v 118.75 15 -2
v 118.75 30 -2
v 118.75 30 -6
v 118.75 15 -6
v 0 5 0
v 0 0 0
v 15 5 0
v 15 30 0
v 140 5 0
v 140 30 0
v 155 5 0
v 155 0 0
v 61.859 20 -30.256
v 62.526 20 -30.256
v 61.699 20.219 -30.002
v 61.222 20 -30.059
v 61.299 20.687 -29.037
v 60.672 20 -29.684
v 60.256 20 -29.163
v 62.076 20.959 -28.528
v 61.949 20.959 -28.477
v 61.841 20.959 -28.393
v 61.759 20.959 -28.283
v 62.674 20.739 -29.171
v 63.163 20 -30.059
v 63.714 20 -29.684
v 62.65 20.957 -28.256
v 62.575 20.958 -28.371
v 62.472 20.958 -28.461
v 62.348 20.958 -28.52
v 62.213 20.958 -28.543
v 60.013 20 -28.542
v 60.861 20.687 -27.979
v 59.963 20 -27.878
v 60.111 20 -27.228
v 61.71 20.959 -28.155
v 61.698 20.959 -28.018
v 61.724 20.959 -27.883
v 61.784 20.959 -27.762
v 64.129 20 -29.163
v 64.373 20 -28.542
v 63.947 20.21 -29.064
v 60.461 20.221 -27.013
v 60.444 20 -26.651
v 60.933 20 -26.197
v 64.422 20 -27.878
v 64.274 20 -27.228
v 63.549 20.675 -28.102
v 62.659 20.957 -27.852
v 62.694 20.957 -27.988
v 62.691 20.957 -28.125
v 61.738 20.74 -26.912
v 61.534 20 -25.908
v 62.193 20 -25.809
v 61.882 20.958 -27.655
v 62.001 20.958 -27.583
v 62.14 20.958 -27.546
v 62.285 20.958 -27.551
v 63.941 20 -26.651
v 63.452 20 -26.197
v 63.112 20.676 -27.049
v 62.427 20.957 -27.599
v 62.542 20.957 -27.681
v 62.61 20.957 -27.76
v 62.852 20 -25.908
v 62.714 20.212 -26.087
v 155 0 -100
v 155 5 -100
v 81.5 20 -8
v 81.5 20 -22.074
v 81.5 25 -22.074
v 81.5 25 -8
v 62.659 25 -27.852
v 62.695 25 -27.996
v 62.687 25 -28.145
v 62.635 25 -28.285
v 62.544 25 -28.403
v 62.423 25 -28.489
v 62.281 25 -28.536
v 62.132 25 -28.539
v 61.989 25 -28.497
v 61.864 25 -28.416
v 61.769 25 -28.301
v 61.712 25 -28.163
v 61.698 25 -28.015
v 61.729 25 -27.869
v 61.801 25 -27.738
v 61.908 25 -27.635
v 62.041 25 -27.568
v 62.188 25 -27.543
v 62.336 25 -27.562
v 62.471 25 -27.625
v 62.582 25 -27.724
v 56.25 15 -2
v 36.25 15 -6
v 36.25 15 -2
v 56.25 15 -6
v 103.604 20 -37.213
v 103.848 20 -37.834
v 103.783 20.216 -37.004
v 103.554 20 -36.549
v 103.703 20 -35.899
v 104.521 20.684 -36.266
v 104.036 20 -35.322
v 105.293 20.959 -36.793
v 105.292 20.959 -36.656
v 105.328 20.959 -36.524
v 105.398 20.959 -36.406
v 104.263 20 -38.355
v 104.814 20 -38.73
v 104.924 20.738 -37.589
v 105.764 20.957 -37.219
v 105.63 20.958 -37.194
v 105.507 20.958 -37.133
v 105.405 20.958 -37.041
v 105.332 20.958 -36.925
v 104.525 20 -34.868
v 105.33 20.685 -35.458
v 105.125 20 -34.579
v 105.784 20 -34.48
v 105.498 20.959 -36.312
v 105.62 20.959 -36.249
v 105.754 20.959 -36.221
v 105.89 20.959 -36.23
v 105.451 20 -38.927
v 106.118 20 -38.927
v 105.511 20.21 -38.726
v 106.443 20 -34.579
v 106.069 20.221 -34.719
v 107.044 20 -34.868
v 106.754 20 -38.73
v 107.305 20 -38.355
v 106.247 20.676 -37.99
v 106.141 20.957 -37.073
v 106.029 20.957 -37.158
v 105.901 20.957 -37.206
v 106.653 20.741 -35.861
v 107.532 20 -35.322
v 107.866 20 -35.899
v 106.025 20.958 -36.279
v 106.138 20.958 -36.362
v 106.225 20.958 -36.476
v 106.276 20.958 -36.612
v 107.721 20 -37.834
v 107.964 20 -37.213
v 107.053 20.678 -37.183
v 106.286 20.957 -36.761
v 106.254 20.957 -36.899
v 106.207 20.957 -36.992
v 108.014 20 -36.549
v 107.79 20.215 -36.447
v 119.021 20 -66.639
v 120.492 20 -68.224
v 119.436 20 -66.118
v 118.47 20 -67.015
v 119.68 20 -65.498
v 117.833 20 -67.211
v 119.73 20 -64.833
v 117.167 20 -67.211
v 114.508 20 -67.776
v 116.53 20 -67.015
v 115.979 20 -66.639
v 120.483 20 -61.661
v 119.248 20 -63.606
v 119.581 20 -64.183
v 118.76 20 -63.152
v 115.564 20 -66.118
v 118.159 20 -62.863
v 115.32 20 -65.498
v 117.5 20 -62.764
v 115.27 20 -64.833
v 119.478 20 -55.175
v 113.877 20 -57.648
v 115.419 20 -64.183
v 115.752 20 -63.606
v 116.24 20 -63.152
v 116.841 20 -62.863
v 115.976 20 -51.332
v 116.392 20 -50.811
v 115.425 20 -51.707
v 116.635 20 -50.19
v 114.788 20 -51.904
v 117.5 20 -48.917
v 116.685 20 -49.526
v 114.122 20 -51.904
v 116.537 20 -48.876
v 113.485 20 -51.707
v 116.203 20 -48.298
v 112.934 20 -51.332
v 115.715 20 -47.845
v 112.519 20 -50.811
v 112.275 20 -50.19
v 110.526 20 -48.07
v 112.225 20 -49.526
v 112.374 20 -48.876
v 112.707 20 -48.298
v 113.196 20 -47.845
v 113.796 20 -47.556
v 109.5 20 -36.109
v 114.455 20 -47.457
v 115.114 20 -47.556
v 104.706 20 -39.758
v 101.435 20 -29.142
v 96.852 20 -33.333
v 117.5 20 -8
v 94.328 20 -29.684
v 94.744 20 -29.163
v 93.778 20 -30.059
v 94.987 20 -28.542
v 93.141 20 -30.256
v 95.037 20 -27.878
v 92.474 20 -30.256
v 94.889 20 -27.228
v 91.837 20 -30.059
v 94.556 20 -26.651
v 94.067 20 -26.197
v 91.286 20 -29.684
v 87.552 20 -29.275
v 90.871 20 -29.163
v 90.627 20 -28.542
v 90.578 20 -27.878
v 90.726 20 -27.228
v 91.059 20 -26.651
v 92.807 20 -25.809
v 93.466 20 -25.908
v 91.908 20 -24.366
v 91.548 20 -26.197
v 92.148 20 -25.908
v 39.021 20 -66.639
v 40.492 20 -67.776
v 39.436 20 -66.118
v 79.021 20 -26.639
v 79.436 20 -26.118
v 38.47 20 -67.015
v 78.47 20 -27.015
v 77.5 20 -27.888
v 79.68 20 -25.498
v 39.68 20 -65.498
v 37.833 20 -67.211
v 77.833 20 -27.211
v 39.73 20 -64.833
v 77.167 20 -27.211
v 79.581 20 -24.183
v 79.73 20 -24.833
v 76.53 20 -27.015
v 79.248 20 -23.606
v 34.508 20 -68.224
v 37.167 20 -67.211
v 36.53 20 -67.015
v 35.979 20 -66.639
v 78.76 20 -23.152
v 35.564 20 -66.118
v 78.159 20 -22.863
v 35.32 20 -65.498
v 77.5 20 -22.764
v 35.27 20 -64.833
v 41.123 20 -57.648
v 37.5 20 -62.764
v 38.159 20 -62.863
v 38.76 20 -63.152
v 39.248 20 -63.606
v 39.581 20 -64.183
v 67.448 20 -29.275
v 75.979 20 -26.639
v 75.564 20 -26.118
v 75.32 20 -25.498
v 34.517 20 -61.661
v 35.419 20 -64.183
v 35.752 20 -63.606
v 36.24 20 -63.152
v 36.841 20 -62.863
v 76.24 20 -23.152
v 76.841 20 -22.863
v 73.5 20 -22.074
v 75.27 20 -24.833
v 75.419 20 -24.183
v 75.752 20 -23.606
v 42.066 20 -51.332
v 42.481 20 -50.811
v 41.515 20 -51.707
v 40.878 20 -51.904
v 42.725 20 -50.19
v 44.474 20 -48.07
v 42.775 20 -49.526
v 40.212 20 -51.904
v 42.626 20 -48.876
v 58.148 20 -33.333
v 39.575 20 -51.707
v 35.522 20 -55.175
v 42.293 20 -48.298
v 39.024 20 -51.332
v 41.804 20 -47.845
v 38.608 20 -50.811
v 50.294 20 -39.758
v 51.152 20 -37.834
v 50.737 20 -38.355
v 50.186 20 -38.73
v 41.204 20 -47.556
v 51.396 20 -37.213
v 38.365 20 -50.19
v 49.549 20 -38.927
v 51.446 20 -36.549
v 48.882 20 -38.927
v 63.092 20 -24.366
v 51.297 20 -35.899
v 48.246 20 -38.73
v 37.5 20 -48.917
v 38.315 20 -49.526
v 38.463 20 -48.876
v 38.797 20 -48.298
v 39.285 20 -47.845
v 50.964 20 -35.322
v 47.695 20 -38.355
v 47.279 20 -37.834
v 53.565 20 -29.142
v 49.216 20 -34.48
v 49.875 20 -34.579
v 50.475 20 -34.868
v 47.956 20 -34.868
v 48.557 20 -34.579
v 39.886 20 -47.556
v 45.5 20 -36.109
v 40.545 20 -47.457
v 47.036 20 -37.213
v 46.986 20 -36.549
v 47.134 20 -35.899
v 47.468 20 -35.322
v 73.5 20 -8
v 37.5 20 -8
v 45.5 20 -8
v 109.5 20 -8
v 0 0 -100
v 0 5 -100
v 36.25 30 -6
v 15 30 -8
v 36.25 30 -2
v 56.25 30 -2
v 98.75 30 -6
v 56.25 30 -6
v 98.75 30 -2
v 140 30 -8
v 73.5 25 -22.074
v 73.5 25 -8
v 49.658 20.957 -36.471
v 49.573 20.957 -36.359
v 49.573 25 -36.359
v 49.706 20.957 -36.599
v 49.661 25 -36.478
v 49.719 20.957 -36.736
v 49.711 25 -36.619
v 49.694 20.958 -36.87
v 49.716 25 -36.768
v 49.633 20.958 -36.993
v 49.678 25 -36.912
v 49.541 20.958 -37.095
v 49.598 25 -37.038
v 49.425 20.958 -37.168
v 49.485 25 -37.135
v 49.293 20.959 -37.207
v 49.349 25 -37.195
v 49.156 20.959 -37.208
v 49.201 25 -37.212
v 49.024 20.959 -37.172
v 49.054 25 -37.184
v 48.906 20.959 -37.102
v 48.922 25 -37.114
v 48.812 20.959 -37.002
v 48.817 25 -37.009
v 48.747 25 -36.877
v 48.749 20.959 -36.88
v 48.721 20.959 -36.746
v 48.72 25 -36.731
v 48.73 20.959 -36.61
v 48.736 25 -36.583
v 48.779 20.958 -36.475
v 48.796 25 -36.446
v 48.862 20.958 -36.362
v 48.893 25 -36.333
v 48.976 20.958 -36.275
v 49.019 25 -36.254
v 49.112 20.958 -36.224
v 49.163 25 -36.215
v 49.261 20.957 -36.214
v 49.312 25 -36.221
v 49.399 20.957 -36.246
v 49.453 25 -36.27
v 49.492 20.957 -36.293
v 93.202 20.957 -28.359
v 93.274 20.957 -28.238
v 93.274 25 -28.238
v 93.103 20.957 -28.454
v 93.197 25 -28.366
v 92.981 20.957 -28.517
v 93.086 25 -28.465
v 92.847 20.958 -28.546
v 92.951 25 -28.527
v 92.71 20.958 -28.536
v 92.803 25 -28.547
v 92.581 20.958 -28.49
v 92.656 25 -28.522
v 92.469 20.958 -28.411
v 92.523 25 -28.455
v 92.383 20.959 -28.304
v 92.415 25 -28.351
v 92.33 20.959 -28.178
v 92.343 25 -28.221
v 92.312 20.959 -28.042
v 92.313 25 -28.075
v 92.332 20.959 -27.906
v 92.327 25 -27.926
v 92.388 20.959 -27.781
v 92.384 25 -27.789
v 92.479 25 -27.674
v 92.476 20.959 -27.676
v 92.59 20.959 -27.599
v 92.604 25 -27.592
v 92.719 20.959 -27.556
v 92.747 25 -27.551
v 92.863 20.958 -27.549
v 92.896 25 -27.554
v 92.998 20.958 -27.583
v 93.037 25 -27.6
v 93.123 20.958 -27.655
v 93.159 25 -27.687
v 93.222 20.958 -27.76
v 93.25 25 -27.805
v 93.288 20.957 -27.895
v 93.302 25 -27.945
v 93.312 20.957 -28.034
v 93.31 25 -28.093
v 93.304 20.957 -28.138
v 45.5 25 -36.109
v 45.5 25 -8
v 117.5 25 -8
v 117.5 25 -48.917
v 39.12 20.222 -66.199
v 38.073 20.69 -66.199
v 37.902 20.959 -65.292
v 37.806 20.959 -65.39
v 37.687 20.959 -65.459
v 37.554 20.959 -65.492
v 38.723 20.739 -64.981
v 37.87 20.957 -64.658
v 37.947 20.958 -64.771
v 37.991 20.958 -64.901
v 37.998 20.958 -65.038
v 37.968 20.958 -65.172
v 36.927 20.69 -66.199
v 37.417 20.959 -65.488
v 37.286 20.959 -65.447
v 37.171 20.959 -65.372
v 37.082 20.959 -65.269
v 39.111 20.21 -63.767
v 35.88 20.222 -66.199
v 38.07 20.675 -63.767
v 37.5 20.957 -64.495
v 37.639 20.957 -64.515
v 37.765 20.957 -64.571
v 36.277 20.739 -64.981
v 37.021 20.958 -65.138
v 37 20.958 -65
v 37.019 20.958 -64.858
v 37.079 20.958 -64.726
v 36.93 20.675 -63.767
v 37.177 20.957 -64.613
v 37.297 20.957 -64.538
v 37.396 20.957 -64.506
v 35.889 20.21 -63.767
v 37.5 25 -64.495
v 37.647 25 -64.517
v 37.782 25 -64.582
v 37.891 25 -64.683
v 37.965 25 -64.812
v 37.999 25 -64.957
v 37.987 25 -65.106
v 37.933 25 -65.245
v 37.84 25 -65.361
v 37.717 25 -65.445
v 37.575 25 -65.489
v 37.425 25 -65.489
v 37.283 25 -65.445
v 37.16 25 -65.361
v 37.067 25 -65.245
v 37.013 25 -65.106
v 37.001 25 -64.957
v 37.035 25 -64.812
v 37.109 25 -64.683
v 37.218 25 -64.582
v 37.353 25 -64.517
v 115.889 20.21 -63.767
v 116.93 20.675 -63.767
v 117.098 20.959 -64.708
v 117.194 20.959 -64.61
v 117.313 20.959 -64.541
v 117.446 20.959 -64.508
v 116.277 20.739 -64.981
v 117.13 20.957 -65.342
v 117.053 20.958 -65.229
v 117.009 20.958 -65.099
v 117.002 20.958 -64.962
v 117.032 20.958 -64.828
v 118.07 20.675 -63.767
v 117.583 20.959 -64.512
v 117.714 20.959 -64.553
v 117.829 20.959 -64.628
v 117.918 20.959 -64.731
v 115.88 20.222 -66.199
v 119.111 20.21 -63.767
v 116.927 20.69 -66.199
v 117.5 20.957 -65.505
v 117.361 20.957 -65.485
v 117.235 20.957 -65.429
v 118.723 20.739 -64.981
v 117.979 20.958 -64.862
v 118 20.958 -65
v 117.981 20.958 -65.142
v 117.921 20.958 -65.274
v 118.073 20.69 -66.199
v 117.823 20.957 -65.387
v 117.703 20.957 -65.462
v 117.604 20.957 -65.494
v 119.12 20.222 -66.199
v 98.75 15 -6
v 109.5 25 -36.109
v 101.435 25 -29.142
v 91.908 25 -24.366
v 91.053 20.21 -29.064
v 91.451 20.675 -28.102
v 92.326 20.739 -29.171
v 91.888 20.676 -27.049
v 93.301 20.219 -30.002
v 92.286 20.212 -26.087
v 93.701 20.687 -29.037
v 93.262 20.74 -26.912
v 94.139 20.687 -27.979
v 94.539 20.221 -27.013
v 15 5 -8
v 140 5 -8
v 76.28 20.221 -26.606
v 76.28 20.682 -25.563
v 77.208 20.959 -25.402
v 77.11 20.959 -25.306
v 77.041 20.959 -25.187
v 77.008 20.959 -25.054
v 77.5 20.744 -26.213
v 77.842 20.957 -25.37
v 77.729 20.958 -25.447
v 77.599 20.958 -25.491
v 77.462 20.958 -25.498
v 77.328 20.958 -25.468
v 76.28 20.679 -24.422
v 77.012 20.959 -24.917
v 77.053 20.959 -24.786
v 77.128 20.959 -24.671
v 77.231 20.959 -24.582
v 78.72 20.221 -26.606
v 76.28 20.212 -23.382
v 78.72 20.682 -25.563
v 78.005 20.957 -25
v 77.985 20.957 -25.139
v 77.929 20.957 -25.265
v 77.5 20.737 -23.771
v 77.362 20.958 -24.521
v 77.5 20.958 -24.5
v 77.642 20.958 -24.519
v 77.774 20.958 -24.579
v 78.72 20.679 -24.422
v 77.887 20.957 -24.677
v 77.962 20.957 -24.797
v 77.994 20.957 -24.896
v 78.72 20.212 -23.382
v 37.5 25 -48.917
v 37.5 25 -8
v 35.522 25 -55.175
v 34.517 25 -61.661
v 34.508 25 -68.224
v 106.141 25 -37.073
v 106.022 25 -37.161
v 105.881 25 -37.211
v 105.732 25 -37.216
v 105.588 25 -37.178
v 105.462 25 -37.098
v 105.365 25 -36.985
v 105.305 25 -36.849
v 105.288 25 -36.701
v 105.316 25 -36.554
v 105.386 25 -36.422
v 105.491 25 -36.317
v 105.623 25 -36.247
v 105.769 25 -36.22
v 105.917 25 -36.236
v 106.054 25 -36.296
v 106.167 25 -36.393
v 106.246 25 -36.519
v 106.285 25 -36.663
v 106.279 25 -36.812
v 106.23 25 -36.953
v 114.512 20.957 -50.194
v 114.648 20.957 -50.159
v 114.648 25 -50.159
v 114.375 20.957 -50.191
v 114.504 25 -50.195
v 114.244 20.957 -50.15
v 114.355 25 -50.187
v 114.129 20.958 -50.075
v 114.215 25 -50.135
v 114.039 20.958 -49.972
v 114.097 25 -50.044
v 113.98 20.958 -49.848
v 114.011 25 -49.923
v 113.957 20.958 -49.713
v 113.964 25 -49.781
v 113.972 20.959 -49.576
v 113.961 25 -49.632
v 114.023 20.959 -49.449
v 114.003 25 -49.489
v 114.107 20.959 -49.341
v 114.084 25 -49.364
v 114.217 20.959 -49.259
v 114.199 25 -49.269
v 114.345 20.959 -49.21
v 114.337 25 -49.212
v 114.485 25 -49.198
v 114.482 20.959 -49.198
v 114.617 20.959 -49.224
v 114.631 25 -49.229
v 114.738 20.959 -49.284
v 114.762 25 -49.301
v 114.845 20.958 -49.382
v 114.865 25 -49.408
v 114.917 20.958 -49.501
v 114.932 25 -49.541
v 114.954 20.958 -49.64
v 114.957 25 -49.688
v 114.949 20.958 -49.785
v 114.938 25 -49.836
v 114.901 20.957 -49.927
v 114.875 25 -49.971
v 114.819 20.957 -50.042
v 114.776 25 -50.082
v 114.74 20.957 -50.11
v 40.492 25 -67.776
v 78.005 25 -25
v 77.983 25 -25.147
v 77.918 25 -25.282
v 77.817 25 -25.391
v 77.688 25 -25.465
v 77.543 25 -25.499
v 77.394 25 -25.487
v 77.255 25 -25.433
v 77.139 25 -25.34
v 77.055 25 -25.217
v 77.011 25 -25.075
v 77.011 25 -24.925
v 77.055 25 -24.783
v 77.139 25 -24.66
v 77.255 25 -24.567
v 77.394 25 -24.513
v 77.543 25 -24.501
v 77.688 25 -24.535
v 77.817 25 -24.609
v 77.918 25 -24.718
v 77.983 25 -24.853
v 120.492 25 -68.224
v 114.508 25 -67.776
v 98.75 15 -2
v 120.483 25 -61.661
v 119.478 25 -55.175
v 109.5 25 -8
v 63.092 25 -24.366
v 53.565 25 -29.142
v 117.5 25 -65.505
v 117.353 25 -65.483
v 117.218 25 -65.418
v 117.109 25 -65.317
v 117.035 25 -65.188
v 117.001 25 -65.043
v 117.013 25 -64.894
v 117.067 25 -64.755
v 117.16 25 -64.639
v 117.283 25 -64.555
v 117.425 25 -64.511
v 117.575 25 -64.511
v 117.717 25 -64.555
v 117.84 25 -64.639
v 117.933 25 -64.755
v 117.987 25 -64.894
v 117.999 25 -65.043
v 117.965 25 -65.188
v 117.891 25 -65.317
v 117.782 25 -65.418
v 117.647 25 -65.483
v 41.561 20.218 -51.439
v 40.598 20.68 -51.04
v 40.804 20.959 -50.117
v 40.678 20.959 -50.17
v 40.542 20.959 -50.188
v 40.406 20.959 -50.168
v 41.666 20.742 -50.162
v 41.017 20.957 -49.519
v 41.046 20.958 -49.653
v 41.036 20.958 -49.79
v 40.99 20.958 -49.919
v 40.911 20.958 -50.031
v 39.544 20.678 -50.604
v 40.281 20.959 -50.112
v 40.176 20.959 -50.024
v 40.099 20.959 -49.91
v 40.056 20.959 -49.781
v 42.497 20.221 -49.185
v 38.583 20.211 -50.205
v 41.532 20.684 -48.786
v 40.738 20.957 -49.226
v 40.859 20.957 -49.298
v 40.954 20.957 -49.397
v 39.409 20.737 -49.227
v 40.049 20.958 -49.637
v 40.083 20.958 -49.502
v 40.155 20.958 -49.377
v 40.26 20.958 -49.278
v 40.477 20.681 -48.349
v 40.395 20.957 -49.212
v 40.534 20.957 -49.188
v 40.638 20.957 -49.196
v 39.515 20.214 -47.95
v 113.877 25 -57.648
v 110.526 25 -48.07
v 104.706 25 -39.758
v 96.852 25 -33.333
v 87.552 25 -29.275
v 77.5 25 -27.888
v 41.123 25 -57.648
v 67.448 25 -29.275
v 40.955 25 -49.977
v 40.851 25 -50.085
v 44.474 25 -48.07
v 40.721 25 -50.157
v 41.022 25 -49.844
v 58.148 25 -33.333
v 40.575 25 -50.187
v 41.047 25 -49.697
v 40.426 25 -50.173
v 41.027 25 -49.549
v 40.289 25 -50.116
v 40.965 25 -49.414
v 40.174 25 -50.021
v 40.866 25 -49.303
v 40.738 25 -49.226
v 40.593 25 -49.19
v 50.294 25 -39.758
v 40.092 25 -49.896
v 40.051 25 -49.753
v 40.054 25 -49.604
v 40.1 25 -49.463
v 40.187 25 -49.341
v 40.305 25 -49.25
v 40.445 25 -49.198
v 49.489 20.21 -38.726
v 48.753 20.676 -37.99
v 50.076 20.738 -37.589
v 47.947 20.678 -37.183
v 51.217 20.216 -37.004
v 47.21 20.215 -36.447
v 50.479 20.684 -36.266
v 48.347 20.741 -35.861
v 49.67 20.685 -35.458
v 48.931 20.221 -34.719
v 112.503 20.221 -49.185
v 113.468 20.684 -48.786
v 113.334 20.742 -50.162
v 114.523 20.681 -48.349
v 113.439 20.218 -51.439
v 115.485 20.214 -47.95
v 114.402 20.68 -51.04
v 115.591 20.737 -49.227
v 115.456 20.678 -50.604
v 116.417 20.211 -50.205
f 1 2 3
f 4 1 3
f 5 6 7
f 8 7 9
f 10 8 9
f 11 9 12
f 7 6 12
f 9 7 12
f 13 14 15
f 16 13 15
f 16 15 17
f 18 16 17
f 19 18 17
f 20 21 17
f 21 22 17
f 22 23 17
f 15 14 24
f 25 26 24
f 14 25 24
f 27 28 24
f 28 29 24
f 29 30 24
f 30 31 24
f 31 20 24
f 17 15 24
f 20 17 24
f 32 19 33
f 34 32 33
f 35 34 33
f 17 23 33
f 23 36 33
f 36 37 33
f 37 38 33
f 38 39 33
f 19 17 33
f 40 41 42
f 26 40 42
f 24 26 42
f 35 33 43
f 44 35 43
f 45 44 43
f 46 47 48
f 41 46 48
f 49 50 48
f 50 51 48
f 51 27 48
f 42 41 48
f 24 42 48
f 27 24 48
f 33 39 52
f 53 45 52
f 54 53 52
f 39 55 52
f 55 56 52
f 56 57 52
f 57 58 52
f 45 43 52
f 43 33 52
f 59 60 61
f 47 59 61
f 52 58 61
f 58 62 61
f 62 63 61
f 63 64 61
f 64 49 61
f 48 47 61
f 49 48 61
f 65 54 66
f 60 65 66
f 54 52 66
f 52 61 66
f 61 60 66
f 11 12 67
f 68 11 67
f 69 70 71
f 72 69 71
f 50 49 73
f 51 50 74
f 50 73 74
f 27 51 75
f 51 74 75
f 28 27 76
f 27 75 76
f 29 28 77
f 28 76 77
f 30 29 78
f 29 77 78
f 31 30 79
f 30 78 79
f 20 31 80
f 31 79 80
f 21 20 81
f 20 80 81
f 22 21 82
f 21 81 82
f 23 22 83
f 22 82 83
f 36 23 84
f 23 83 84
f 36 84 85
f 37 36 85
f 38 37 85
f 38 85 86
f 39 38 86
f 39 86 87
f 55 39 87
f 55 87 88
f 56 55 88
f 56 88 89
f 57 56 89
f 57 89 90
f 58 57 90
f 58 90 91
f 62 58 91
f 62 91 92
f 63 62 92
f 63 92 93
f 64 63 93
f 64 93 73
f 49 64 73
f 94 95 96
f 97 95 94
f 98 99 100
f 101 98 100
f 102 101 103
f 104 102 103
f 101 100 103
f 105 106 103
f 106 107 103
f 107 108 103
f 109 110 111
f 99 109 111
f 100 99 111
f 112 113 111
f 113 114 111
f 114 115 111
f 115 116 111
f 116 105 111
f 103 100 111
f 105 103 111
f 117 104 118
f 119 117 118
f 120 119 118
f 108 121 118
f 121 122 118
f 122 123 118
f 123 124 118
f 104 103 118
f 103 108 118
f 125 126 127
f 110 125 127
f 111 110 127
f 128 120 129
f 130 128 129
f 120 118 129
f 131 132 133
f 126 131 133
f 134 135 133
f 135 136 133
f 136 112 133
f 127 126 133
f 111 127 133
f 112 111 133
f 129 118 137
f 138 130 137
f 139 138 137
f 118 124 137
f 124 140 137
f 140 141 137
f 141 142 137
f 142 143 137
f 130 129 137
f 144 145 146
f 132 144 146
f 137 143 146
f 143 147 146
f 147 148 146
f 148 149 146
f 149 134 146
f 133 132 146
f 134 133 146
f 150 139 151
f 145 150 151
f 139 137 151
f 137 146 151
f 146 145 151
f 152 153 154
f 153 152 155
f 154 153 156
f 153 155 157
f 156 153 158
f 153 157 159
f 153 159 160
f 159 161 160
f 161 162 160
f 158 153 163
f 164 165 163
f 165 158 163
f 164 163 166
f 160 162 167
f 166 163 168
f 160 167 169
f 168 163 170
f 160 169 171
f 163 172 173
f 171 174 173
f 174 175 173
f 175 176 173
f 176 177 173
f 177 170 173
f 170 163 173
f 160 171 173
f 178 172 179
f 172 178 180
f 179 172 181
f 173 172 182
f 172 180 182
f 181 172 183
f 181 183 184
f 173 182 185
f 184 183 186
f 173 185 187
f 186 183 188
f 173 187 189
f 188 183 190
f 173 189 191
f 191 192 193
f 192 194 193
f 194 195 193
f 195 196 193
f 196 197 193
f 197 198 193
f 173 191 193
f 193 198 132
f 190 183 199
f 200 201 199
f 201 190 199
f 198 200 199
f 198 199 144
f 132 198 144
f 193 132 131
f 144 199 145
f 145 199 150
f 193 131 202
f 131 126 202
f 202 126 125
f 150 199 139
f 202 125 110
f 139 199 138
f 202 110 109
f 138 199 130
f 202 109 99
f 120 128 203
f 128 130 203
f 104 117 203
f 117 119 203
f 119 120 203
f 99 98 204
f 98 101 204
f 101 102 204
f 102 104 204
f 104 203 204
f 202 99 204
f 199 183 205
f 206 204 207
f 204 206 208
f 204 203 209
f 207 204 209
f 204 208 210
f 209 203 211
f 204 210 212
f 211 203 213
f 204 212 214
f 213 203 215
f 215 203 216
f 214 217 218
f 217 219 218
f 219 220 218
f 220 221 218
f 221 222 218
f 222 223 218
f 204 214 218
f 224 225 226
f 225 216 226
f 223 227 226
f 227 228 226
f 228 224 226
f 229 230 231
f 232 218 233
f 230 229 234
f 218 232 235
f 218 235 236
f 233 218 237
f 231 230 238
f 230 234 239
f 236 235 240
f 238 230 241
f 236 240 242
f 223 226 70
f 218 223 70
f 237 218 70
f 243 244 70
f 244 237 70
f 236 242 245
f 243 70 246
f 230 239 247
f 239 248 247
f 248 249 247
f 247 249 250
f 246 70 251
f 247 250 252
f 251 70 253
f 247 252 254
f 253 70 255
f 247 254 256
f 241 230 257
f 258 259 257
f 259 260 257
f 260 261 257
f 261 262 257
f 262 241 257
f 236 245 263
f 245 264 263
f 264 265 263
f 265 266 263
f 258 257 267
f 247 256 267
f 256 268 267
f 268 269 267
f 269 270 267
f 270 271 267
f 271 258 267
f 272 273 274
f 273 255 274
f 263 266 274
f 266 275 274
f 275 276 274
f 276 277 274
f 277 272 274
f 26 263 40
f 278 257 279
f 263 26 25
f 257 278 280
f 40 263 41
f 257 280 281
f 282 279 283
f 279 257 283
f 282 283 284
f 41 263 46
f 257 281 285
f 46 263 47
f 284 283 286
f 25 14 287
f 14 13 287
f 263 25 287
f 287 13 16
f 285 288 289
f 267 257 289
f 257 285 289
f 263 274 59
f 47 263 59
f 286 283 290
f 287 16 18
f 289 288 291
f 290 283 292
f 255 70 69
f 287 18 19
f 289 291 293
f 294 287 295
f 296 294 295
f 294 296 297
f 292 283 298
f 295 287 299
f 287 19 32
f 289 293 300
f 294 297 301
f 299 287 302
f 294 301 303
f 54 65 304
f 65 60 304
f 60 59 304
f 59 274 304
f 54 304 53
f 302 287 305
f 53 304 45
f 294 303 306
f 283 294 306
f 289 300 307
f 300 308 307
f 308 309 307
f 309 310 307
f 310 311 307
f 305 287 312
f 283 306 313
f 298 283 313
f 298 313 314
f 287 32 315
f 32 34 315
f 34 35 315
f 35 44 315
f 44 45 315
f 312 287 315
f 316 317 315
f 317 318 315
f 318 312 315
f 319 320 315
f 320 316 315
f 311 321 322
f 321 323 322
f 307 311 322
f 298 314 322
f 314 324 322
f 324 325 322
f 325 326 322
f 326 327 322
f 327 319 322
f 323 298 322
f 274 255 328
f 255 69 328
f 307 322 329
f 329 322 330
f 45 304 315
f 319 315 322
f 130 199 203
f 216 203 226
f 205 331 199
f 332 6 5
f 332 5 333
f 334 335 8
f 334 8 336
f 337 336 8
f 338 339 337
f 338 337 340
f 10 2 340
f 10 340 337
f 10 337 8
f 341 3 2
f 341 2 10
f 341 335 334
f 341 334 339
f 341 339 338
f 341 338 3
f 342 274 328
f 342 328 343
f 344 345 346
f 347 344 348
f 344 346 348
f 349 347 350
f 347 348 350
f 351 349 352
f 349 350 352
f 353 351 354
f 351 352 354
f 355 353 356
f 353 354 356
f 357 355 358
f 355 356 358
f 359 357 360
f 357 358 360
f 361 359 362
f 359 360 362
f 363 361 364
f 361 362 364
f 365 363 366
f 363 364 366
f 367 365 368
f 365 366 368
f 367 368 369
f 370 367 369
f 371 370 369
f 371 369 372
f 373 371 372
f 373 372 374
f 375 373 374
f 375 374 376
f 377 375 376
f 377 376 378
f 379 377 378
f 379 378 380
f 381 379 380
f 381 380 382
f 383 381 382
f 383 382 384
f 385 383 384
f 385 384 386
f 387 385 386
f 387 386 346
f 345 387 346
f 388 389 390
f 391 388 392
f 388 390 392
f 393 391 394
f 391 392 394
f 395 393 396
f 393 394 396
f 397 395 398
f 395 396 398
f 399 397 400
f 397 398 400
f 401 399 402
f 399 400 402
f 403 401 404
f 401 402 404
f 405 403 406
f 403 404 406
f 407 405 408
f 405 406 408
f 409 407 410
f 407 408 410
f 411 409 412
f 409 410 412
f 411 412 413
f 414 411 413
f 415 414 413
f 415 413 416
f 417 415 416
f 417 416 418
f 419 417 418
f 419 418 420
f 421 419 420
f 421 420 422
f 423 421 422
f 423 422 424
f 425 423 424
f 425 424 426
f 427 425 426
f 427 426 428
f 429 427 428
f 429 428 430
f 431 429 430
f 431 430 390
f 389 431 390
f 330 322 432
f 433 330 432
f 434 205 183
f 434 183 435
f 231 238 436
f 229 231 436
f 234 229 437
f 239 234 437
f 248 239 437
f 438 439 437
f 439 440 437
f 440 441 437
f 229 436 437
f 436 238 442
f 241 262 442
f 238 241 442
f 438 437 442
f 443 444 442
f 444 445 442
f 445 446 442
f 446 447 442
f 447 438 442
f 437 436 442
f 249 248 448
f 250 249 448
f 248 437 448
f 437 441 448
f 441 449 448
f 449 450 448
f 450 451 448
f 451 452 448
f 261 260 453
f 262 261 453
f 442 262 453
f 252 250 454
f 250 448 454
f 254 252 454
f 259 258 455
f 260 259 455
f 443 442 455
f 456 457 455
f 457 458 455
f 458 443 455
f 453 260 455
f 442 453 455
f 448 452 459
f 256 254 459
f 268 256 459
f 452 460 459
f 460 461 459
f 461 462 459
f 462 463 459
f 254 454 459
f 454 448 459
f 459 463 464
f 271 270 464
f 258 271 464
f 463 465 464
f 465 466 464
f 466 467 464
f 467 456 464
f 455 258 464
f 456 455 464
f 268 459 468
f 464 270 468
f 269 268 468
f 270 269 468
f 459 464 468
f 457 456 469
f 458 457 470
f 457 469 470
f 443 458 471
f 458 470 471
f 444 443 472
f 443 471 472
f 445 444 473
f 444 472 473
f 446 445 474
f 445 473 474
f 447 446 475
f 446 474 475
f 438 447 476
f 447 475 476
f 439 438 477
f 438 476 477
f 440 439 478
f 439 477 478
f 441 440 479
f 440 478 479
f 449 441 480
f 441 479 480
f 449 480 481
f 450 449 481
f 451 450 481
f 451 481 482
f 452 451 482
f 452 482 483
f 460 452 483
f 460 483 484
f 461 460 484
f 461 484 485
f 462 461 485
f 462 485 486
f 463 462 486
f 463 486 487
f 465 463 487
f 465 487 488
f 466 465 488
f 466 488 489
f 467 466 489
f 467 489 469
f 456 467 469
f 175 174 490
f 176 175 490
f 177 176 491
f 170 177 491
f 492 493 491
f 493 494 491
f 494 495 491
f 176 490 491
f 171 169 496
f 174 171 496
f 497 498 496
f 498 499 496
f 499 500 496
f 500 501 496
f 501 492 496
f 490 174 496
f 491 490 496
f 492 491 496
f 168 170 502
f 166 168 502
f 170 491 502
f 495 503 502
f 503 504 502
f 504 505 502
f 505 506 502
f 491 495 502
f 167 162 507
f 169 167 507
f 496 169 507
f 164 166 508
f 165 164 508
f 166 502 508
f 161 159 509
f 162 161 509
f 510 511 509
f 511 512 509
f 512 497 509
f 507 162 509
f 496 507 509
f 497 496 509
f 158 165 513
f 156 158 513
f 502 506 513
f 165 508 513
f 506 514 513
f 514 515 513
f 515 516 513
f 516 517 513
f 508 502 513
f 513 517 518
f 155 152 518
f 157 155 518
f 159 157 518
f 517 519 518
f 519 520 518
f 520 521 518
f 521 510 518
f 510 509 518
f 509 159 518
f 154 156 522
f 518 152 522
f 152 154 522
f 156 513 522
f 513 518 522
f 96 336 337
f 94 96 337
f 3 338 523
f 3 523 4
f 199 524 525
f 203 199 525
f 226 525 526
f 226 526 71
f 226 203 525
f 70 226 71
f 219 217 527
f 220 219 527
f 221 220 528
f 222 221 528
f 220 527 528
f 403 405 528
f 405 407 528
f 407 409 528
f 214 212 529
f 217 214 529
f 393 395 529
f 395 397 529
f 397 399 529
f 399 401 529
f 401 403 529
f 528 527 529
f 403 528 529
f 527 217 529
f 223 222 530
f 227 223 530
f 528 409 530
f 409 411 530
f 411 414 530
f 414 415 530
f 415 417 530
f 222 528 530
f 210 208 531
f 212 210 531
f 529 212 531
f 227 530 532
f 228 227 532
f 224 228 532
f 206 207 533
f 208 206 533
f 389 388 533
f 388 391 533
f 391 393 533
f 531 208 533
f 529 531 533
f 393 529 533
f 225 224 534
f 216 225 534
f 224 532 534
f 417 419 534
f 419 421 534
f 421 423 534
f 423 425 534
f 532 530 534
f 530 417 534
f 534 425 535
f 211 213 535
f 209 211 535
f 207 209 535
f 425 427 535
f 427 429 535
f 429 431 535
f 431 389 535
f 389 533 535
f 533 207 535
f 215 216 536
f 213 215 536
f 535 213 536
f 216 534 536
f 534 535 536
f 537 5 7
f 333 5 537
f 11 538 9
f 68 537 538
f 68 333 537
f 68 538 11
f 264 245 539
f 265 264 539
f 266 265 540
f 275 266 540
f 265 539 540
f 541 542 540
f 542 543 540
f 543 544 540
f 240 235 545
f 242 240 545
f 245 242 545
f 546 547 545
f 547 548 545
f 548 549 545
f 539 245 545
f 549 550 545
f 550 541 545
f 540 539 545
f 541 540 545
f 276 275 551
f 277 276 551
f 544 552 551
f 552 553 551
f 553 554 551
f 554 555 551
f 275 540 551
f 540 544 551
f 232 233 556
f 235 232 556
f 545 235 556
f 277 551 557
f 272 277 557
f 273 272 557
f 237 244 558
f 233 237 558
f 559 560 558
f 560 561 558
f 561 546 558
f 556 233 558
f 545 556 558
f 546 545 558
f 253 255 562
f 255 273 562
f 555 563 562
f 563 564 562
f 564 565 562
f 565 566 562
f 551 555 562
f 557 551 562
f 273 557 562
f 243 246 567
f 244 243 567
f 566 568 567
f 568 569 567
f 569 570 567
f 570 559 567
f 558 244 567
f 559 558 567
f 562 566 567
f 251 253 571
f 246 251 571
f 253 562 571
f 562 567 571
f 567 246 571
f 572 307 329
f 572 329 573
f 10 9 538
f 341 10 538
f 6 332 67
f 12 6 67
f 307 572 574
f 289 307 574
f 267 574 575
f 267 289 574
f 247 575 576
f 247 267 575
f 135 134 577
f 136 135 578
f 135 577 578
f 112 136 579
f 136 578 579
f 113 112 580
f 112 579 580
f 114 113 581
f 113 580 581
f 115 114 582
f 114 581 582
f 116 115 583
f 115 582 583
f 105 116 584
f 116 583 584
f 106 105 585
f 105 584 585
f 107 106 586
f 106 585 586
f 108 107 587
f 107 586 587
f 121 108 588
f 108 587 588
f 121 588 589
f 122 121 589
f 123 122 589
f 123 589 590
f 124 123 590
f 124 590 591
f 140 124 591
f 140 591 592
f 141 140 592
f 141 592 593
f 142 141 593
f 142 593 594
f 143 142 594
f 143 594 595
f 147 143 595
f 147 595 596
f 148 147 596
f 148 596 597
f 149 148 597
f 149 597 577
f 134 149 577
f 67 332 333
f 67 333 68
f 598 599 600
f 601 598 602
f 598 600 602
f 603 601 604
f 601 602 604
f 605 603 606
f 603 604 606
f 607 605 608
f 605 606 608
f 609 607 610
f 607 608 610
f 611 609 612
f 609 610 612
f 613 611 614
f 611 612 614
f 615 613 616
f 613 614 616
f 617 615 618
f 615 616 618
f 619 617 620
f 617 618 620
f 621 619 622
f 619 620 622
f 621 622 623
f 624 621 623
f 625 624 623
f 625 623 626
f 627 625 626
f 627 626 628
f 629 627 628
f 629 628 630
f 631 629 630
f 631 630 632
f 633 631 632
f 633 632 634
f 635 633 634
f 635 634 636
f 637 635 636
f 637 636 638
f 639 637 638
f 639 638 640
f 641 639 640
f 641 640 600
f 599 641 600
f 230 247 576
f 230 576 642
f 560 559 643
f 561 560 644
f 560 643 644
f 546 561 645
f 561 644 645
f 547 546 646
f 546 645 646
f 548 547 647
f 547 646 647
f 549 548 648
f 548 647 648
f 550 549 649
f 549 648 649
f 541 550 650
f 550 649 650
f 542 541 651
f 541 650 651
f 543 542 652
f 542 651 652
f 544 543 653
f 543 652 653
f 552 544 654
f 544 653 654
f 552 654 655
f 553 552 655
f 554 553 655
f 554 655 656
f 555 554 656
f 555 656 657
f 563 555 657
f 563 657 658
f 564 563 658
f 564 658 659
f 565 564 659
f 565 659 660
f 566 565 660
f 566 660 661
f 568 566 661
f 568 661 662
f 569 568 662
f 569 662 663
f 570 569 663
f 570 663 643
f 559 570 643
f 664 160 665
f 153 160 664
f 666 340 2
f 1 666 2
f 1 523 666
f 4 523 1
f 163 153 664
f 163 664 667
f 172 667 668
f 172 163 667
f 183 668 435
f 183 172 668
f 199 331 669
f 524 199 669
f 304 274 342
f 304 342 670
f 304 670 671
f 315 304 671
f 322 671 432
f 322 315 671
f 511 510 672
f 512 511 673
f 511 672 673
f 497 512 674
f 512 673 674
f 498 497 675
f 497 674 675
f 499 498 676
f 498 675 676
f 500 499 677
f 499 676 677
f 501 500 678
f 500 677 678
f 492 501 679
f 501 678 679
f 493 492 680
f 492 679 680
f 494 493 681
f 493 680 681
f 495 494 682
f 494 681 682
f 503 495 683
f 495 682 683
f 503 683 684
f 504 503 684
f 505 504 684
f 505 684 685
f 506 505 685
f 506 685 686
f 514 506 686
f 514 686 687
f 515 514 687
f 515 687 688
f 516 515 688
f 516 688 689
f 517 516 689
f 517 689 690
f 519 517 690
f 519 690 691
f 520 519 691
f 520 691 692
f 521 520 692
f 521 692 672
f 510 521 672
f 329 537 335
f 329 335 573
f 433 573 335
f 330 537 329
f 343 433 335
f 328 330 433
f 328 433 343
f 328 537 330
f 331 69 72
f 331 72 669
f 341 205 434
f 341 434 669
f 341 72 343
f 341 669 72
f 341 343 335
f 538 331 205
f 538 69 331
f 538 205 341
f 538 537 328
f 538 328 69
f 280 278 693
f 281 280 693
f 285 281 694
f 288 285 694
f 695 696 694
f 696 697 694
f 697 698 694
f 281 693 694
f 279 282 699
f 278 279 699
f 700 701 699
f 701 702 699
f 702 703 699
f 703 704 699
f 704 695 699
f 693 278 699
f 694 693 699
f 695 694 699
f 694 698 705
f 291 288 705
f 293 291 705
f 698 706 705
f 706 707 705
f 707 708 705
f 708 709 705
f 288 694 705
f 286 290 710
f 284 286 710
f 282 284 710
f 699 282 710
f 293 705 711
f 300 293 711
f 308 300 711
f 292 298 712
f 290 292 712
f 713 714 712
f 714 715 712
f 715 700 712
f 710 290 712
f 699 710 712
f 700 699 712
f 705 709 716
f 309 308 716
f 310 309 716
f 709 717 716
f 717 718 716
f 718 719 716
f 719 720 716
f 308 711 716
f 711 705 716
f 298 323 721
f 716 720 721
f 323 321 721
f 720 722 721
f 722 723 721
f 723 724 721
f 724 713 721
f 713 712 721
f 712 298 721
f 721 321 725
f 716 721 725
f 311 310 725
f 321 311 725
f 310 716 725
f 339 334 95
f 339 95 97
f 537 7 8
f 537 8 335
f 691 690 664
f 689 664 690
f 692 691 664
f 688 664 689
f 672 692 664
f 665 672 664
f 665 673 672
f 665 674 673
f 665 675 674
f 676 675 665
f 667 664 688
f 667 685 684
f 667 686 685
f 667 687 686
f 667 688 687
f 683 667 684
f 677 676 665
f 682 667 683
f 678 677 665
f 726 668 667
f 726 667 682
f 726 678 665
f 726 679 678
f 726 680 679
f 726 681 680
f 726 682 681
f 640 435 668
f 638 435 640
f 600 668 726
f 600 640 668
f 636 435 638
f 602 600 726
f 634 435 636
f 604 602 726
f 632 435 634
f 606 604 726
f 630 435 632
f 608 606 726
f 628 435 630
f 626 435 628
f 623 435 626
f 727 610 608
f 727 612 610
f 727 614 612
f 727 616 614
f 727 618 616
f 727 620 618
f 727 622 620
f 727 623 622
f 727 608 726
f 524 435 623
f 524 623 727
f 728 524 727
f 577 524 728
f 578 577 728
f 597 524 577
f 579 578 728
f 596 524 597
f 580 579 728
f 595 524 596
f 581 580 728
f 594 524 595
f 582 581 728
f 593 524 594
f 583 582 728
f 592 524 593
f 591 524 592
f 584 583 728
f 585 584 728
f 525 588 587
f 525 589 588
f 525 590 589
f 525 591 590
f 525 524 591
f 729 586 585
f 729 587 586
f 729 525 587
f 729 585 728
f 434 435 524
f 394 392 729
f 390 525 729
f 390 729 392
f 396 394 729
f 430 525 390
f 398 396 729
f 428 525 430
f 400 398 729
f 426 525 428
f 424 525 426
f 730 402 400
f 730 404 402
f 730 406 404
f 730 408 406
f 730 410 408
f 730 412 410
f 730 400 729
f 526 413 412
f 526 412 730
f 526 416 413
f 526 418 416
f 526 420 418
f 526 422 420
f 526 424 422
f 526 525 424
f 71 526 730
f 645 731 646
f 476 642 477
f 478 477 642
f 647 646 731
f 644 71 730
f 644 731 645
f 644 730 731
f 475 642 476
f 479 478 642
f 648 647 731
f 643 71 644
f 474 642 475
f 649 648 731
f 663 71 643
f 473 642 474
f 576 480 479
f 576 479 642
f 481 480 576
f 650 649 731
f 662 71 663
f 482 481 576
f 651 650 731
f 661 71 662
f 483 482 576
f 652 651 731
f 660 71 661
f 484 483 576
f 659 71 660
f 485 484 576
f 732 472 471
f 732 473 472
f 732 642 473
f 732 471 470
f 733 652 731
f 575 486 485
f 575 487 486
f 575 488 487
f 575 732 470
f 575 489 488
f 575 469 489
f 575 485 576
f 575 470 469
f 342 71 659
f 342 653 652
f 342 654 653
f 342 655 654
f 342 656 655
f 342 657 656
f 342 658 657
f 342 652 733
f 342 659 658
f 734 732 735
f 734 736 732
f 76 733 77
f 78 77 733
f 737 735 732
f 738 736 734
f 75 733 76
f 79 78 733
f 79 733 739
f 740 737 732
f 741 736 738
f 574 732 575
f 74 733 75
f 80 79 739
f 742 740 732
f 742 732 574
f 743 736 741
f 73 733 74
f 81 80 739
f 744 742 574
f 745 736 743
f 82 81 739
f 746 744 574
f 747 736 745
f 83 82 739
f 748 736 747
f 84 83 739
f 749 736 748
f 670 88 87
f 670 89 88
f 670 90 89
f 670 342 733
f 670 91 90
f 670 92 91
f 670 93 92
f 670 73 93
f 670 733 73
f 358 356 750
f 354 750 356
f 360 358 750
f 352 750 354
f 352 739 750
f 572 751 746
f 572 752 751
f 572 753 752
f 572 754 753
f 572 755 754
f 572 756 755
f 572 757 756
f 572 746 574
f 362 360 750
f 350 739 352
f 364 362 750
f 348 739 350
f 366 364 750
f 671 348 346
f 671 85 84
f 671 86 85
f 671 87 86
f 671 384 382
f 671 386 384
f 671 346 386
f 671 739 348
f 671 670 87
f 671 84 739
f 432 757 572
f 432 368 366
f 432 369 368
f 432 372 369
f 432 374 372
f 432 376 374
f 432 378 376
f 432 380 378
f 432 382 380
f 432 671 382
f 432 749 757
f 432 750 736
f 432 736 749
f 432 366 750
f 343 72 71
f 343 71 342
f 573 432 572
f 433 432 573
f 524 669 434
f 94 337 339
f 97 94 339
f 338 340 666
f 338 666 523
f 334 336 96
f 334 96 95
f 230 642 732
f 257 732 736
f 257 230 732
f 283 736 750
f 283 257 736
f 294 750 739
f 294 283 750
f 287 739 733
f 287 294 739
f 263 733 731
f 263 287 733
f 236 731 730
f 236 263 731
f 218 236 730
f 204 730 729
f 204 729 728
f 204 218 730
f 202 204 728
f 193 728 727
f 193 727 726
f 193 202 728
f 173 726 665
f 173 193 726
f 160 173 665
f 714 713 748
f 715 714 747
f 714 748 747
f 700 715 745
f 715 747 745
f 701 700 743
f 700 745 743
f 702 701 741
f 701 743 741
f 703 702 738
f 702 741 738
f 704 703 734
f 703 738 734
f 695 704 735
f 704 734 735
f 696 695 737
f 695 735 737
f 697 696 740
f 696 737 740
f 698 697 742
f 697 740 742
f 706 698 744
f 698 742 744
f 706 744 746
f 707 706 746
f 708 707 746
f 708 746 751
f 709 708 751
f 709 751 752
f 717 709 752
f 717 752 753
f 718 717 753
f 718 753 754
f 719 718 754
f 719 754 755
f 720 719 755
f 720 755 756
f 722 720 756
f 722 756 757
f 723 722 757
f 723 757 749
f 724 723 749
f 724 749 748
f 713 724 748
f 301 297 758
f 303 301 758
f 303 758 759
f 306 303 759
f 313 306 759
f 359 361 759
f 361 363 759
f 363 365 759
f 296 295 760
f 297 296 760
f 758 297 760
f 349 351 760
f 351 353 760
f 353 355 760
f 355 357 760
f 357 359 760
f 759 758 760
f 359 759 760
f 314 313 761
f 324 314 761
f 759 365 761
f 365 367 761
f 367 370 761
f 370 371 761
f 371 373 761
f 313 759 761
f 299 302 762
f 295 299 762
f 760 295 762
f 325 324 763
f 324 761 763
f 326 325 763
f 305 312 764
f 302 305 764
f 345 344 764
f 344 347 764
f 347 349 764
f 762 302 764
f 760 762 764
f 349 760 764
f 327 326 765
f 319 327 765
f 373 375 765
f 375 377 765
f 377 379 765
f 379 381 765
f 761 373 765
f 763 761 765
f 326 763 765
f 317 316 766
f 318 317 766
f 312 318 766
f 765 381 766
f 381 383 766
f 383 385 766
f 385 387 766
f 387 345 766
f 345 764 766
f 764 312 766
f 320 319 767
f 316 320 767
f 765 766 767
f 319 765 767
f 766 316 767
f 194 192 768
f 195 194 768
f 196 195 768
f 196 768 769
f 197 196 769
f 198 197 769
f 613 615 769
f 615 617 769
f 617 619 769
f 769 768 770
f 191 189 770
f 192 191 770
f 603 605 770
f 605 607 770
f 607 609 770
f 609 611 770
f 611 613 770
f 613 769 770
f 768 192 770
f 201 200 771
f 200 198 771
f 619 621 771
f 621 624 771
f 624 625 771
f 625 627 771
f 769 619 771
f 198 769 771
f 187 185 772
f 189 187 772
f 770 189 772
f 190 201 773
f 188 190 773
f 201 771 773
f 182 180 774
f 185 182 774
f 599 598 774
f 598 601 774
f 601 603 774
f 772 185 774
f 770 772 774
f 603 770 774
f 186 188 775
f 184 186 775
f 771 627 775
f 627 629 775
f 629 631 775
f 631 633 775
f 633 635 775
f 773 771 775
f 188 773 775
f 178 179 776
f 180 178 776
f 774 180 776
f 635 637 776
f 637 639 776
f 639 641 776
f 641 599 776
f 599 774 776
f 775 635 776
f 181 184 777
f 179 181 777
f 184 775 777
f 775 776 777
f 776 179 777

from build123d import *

# Parameters (mm, degrees)
SKETCH_1_W               = 155
SKETCH_1_H               = 100
EXTRUDE_1_DEPTH          = 5
SKETCH_2_W               = 125
SKETCH_2_H               = 8
EXTRUDE_2_DEPTH          = 25
EXTRUDE_6_DEPTH          = 20
EXTRUDE_7_REACH          = 184.727
EXTRUDE_7_END_RADIUS     = 43.11234224
SKETCH_11_W              = 8
SKETCH_11_H              = 5
SKETCH_12_W              = 125
SKETCH_12_H              = 15
CUT_EXTRUDE_1_DEPTH      = 130
PATTERN_CIRCULAR_1_COUNT = 5
PATTERN_CIRCULAR_1_ANGLE = 90
F_1_THE_OTHER_WAY_COUNT  = 5
F_1_THE_OTHER_WAY_ANGLE  = 90
CUT_EXTRUDE_2_REACH      = 188.145
CUT_EXTRUDE_2_END_RADIUS = 3
SKETCH_17_R              = 0.5
PATTERN_CIRCULAR_2_COUNT = 9
PATTERN_CIRCULAR_2_ANGLE = 180
SKETCH_19_W              = 20
SKETCH_19_H              = 4
CUT_EXTRUDE_3_DEPTH      = 15


with BuildPart() as part:
    # 草图1 → 凸台-拉伸1 (new body)
    with BuildSketch(Plane(origin=(0, 0, 0), x_dir=(1, 0, 0), z_dir=(0, 1, 0))):
        with Locations((77.5, 50)):
            Rectangle(SKETCH_1_W, SKETCH_1_H)
    extrude(amount=EXTRUDE_1_DEPTH)

    # 草图2 → 凸台-拉伸2 (add)
    with BuildSketch(Plane(origin=(0, 5, 0), x_dir=(1, 0, 0), z_dir=(0, 1, 0))):
        with Locations((77.5, 4)):
            Rectangle(SKETCH_2_W, SKETCH_2_H)
    extrude(amount=EXTRUDE_2_DEPTH)

    # 草图7 → 凸台-拉伸6 (add)
    with BuildSketch(Plane(origin=(0, 5, 0), x_dir=(1, 0, 0), z_dir=(0, 1, 0))):
        with BuildLine():
            Line((34.50840207, 68.224369845), (40.49159793, 67.775630155))
            ThreePointArc((40.49159793, 67.775630155), (77.5, 27.88765776), (114.50840207, 67.775630155))
            Line((114.50840207, 67.775630155), (120.49159793, 68.224369845))
            ThreePointArc((120.49159793, 68.224369845), (77.5, 21.88765776), (34.50840207, 68.224369845))
        make_face()
    extrude(amount=EXTRUDE_6_DEPTH)

    # 凸台-拉伸7: up to this cylinder (the profile starts outside it)
    extrude_7_end = Plane(origin=(77.5, 22.5, -65), z_dir=(0, -1, 0)) * Cylinder(EXTRUDE_7_END_RADIUS, 456.67868448, mode=Mode.PRIVATE)
    # 草图11 → 凸台-拉伸7 (add, up to the surface)
    with BuildSketch(Plane(origin=(0, 0, -8), x_dir=(-1, 0, 0), z_dir=(0, 0, -1)), mode=Mode.PRIVATE) as extrude_7_sk1:
        with Locations((-77.5, 22.5)):
            Rectangle(SKETCH_11_W, SKETCH_11_H)
    extrude_7_tool1 = extrude(extrude_7_sk1.sketch, amount=EXTRUDE_7_REACH, mode=Mode.PRIVATE) - extrude_7_end
    add(extrude_7_tool1.solids().sort_by_distance((77.5, 22.5, -8))[0])
    # 草图11 → 凸台-拉伸7 (add, up to the surface)
    with BuildSketch(Plane(origin=(0, 0, -8), x_dir=(-1, 0, 0), z_dir=(0, 0, -1)), mode=Mode.PRIVATE) as extrude_7_sk2:
        with Locations((-41.5, 22.5)):
            Rectangle(SKETCH_11_W, SKETCH_11_H)
    extrude_7_tool2 = extrude(extrude_7_sk2.sketch, amount=EXTRUDE_7_REACH, mode=Mode.PRIVATE) - extrude_7_end
    add(extrude_7_tool2.solids().sort_by_distance((41.5, 22.5, -8))[0])
    # 草图11 → 凸台-拉伸7 (add, up to the surface)
    with BuildSketch(Plane(origin=(0, 0, -8), x_dir=(-1, 0, 0), z_dir=(0, 0, -1)), mode=Mode.PRIVATE) as extrude_7_sk3:
        with Locations((-113.5, 22.5)):
            Rectangle(SKETCH_11_W, SKETCH_11_H)
    extrude_7_tool3 = extrude(extrude_7_sk3.sketch, amount=EXTRUDE_7_REACH, mode=Mode.PRIVATE) - extrude_7_end
    add(extrude_7_tool3.solids().sort_by_distance((113.5, 22.5, -8))[0])

    # 草图12 → 切除-拉伸1 (cut)
    with BuildSketch(Plane(origin=(0, 0, -8), x_dir=(-1, 0, 0), z_dir=(0, 0, -1))):
        with Locations((-77.5, 12.5)):
            Rectangle(SKETCH_12_W, SKETCH_12_H)
    extrude(amount=CUT_EXTRUDE_1_DEPTH, mode=Mode.SUBTRACT)

    # 草图16 → 切除-旋转3 (revolve, cut)
    with BuildSketch(Plane(origin=(0, 18, 0), x_dir=(-1, 0, 0), z_dir=(0, -1, 0))):
        with BuildLine():
            Line((-80.5, 25), (-74.5, 25))
            ThreePointArc((-74.5, 25), (-77.5, 22), (-80.5, 25))
        make_face()
    cut_revolve_3 = revolve(axis=Axis((74.5, 18, -25), (1, 0, 0)), mode=Mode.SUBTRACT)

    # 阵列(圆周)1: 切除-旋转3 ×5 about axis
    pattern_circular_1_axis = Axis((77.5, 0, -65), (0, -1, 0))
    for i in range(1, PATTERN_CIRCULAR_1_COUNT):
        add(cut_revolve_3.rotate(pattern_circular_1_axis, i * PATTERN_CIRCULAR_1_ANGLE / (PATTERN_CIRCULAR_1_COUNT - 1)), mode=Mode.SUBTRACT)

    # 1 the other way: 切除-旋转3 ×5 about axis
    f_1_the_other_way_axis = Axis((77.5, 0, -65), (0, 1, 0))
    for i in range(1, F_1_THE_OTHER_WAY_COUNT):
        add(cut_revolve_3.rotate(f_1_the_other_way_axis, i * F_1_THE_OTHER_WAY_ANGLE / (F_1_THE_OTHER_WAY_COUNT - 1)), mode=Mode.SUBTRACT)

    # 切除-拉伸2: up to this sphere (the profile starts outside it)
    cut_extrude_2_end = Location((37.5, 18, -65)) * Sphere(CUT_EXTRUDE_2_END_RADIUS, mode=Mode.PRIVATE)
    # 草图17 → 切除-拉伸2 (cut, up to the surface)
    with BuildSketch(Plane(origin=(0, 25, 0), x_dir=(1, 0, 0), z_dir=(0, 1, 0)), mode=Mode.PRIVATE) as cut_extrude_2_sk1:
        with Locations(Location((37.5, 64.994842405, 0), (0, 0, 270))):
            Circle(SKETCH_17_R)
    cut_extrude_2_tool1 = extrude(cut_extrude_2_sk1.sketch, amount=-CUT_EXTRUDE_2_REACH, mode=Mode.PRIVATE) - cut_extrude_2_end
    cut_extrude_2 = cut_extrude_2_tool1.solids().sort_by_distance((37.5, 25, -64.994842))[0]
    add(cut_extrude_2, mode=Mode.SUBTRACT)

    # 阵列(圆周)2: 切除-拉伸2 ×9 about axis
    pattern_circular_2_axis = Axis((77.5, 0, -65), (0, 1, 0))
    for i in range(1, PATTERN_CIRCULAR_2_COUNT):
        add(cut_extrude_2.rotate(pattern_circular_2_axis, i * PATTERN_CIRCULAR_2_ANGLE / (PATTERN_CIRCULAR_2_COUNT - 1)), mode=Mode.SUBTRACT)

    # 草图19 → 切除-拉伸3 (cut)
    with BuildSketch(Plane(origin=(0, 30, 0), x_dir=(1, 0, 0), z_dir=(0, 1, 0))):
        with Locations((46.25, 4)):
            Rectangle(SKETCH_19_W, SKETCH_19_H)
        with Locations((108.75, 4)):
            Rectangle(SKETCH_19_W, SKETCH_19_H)
    extrude(amount=-CUT_EXTRUDE_3_DEPTH, mode=Mode.SUBTRACT)


solid = part.part
